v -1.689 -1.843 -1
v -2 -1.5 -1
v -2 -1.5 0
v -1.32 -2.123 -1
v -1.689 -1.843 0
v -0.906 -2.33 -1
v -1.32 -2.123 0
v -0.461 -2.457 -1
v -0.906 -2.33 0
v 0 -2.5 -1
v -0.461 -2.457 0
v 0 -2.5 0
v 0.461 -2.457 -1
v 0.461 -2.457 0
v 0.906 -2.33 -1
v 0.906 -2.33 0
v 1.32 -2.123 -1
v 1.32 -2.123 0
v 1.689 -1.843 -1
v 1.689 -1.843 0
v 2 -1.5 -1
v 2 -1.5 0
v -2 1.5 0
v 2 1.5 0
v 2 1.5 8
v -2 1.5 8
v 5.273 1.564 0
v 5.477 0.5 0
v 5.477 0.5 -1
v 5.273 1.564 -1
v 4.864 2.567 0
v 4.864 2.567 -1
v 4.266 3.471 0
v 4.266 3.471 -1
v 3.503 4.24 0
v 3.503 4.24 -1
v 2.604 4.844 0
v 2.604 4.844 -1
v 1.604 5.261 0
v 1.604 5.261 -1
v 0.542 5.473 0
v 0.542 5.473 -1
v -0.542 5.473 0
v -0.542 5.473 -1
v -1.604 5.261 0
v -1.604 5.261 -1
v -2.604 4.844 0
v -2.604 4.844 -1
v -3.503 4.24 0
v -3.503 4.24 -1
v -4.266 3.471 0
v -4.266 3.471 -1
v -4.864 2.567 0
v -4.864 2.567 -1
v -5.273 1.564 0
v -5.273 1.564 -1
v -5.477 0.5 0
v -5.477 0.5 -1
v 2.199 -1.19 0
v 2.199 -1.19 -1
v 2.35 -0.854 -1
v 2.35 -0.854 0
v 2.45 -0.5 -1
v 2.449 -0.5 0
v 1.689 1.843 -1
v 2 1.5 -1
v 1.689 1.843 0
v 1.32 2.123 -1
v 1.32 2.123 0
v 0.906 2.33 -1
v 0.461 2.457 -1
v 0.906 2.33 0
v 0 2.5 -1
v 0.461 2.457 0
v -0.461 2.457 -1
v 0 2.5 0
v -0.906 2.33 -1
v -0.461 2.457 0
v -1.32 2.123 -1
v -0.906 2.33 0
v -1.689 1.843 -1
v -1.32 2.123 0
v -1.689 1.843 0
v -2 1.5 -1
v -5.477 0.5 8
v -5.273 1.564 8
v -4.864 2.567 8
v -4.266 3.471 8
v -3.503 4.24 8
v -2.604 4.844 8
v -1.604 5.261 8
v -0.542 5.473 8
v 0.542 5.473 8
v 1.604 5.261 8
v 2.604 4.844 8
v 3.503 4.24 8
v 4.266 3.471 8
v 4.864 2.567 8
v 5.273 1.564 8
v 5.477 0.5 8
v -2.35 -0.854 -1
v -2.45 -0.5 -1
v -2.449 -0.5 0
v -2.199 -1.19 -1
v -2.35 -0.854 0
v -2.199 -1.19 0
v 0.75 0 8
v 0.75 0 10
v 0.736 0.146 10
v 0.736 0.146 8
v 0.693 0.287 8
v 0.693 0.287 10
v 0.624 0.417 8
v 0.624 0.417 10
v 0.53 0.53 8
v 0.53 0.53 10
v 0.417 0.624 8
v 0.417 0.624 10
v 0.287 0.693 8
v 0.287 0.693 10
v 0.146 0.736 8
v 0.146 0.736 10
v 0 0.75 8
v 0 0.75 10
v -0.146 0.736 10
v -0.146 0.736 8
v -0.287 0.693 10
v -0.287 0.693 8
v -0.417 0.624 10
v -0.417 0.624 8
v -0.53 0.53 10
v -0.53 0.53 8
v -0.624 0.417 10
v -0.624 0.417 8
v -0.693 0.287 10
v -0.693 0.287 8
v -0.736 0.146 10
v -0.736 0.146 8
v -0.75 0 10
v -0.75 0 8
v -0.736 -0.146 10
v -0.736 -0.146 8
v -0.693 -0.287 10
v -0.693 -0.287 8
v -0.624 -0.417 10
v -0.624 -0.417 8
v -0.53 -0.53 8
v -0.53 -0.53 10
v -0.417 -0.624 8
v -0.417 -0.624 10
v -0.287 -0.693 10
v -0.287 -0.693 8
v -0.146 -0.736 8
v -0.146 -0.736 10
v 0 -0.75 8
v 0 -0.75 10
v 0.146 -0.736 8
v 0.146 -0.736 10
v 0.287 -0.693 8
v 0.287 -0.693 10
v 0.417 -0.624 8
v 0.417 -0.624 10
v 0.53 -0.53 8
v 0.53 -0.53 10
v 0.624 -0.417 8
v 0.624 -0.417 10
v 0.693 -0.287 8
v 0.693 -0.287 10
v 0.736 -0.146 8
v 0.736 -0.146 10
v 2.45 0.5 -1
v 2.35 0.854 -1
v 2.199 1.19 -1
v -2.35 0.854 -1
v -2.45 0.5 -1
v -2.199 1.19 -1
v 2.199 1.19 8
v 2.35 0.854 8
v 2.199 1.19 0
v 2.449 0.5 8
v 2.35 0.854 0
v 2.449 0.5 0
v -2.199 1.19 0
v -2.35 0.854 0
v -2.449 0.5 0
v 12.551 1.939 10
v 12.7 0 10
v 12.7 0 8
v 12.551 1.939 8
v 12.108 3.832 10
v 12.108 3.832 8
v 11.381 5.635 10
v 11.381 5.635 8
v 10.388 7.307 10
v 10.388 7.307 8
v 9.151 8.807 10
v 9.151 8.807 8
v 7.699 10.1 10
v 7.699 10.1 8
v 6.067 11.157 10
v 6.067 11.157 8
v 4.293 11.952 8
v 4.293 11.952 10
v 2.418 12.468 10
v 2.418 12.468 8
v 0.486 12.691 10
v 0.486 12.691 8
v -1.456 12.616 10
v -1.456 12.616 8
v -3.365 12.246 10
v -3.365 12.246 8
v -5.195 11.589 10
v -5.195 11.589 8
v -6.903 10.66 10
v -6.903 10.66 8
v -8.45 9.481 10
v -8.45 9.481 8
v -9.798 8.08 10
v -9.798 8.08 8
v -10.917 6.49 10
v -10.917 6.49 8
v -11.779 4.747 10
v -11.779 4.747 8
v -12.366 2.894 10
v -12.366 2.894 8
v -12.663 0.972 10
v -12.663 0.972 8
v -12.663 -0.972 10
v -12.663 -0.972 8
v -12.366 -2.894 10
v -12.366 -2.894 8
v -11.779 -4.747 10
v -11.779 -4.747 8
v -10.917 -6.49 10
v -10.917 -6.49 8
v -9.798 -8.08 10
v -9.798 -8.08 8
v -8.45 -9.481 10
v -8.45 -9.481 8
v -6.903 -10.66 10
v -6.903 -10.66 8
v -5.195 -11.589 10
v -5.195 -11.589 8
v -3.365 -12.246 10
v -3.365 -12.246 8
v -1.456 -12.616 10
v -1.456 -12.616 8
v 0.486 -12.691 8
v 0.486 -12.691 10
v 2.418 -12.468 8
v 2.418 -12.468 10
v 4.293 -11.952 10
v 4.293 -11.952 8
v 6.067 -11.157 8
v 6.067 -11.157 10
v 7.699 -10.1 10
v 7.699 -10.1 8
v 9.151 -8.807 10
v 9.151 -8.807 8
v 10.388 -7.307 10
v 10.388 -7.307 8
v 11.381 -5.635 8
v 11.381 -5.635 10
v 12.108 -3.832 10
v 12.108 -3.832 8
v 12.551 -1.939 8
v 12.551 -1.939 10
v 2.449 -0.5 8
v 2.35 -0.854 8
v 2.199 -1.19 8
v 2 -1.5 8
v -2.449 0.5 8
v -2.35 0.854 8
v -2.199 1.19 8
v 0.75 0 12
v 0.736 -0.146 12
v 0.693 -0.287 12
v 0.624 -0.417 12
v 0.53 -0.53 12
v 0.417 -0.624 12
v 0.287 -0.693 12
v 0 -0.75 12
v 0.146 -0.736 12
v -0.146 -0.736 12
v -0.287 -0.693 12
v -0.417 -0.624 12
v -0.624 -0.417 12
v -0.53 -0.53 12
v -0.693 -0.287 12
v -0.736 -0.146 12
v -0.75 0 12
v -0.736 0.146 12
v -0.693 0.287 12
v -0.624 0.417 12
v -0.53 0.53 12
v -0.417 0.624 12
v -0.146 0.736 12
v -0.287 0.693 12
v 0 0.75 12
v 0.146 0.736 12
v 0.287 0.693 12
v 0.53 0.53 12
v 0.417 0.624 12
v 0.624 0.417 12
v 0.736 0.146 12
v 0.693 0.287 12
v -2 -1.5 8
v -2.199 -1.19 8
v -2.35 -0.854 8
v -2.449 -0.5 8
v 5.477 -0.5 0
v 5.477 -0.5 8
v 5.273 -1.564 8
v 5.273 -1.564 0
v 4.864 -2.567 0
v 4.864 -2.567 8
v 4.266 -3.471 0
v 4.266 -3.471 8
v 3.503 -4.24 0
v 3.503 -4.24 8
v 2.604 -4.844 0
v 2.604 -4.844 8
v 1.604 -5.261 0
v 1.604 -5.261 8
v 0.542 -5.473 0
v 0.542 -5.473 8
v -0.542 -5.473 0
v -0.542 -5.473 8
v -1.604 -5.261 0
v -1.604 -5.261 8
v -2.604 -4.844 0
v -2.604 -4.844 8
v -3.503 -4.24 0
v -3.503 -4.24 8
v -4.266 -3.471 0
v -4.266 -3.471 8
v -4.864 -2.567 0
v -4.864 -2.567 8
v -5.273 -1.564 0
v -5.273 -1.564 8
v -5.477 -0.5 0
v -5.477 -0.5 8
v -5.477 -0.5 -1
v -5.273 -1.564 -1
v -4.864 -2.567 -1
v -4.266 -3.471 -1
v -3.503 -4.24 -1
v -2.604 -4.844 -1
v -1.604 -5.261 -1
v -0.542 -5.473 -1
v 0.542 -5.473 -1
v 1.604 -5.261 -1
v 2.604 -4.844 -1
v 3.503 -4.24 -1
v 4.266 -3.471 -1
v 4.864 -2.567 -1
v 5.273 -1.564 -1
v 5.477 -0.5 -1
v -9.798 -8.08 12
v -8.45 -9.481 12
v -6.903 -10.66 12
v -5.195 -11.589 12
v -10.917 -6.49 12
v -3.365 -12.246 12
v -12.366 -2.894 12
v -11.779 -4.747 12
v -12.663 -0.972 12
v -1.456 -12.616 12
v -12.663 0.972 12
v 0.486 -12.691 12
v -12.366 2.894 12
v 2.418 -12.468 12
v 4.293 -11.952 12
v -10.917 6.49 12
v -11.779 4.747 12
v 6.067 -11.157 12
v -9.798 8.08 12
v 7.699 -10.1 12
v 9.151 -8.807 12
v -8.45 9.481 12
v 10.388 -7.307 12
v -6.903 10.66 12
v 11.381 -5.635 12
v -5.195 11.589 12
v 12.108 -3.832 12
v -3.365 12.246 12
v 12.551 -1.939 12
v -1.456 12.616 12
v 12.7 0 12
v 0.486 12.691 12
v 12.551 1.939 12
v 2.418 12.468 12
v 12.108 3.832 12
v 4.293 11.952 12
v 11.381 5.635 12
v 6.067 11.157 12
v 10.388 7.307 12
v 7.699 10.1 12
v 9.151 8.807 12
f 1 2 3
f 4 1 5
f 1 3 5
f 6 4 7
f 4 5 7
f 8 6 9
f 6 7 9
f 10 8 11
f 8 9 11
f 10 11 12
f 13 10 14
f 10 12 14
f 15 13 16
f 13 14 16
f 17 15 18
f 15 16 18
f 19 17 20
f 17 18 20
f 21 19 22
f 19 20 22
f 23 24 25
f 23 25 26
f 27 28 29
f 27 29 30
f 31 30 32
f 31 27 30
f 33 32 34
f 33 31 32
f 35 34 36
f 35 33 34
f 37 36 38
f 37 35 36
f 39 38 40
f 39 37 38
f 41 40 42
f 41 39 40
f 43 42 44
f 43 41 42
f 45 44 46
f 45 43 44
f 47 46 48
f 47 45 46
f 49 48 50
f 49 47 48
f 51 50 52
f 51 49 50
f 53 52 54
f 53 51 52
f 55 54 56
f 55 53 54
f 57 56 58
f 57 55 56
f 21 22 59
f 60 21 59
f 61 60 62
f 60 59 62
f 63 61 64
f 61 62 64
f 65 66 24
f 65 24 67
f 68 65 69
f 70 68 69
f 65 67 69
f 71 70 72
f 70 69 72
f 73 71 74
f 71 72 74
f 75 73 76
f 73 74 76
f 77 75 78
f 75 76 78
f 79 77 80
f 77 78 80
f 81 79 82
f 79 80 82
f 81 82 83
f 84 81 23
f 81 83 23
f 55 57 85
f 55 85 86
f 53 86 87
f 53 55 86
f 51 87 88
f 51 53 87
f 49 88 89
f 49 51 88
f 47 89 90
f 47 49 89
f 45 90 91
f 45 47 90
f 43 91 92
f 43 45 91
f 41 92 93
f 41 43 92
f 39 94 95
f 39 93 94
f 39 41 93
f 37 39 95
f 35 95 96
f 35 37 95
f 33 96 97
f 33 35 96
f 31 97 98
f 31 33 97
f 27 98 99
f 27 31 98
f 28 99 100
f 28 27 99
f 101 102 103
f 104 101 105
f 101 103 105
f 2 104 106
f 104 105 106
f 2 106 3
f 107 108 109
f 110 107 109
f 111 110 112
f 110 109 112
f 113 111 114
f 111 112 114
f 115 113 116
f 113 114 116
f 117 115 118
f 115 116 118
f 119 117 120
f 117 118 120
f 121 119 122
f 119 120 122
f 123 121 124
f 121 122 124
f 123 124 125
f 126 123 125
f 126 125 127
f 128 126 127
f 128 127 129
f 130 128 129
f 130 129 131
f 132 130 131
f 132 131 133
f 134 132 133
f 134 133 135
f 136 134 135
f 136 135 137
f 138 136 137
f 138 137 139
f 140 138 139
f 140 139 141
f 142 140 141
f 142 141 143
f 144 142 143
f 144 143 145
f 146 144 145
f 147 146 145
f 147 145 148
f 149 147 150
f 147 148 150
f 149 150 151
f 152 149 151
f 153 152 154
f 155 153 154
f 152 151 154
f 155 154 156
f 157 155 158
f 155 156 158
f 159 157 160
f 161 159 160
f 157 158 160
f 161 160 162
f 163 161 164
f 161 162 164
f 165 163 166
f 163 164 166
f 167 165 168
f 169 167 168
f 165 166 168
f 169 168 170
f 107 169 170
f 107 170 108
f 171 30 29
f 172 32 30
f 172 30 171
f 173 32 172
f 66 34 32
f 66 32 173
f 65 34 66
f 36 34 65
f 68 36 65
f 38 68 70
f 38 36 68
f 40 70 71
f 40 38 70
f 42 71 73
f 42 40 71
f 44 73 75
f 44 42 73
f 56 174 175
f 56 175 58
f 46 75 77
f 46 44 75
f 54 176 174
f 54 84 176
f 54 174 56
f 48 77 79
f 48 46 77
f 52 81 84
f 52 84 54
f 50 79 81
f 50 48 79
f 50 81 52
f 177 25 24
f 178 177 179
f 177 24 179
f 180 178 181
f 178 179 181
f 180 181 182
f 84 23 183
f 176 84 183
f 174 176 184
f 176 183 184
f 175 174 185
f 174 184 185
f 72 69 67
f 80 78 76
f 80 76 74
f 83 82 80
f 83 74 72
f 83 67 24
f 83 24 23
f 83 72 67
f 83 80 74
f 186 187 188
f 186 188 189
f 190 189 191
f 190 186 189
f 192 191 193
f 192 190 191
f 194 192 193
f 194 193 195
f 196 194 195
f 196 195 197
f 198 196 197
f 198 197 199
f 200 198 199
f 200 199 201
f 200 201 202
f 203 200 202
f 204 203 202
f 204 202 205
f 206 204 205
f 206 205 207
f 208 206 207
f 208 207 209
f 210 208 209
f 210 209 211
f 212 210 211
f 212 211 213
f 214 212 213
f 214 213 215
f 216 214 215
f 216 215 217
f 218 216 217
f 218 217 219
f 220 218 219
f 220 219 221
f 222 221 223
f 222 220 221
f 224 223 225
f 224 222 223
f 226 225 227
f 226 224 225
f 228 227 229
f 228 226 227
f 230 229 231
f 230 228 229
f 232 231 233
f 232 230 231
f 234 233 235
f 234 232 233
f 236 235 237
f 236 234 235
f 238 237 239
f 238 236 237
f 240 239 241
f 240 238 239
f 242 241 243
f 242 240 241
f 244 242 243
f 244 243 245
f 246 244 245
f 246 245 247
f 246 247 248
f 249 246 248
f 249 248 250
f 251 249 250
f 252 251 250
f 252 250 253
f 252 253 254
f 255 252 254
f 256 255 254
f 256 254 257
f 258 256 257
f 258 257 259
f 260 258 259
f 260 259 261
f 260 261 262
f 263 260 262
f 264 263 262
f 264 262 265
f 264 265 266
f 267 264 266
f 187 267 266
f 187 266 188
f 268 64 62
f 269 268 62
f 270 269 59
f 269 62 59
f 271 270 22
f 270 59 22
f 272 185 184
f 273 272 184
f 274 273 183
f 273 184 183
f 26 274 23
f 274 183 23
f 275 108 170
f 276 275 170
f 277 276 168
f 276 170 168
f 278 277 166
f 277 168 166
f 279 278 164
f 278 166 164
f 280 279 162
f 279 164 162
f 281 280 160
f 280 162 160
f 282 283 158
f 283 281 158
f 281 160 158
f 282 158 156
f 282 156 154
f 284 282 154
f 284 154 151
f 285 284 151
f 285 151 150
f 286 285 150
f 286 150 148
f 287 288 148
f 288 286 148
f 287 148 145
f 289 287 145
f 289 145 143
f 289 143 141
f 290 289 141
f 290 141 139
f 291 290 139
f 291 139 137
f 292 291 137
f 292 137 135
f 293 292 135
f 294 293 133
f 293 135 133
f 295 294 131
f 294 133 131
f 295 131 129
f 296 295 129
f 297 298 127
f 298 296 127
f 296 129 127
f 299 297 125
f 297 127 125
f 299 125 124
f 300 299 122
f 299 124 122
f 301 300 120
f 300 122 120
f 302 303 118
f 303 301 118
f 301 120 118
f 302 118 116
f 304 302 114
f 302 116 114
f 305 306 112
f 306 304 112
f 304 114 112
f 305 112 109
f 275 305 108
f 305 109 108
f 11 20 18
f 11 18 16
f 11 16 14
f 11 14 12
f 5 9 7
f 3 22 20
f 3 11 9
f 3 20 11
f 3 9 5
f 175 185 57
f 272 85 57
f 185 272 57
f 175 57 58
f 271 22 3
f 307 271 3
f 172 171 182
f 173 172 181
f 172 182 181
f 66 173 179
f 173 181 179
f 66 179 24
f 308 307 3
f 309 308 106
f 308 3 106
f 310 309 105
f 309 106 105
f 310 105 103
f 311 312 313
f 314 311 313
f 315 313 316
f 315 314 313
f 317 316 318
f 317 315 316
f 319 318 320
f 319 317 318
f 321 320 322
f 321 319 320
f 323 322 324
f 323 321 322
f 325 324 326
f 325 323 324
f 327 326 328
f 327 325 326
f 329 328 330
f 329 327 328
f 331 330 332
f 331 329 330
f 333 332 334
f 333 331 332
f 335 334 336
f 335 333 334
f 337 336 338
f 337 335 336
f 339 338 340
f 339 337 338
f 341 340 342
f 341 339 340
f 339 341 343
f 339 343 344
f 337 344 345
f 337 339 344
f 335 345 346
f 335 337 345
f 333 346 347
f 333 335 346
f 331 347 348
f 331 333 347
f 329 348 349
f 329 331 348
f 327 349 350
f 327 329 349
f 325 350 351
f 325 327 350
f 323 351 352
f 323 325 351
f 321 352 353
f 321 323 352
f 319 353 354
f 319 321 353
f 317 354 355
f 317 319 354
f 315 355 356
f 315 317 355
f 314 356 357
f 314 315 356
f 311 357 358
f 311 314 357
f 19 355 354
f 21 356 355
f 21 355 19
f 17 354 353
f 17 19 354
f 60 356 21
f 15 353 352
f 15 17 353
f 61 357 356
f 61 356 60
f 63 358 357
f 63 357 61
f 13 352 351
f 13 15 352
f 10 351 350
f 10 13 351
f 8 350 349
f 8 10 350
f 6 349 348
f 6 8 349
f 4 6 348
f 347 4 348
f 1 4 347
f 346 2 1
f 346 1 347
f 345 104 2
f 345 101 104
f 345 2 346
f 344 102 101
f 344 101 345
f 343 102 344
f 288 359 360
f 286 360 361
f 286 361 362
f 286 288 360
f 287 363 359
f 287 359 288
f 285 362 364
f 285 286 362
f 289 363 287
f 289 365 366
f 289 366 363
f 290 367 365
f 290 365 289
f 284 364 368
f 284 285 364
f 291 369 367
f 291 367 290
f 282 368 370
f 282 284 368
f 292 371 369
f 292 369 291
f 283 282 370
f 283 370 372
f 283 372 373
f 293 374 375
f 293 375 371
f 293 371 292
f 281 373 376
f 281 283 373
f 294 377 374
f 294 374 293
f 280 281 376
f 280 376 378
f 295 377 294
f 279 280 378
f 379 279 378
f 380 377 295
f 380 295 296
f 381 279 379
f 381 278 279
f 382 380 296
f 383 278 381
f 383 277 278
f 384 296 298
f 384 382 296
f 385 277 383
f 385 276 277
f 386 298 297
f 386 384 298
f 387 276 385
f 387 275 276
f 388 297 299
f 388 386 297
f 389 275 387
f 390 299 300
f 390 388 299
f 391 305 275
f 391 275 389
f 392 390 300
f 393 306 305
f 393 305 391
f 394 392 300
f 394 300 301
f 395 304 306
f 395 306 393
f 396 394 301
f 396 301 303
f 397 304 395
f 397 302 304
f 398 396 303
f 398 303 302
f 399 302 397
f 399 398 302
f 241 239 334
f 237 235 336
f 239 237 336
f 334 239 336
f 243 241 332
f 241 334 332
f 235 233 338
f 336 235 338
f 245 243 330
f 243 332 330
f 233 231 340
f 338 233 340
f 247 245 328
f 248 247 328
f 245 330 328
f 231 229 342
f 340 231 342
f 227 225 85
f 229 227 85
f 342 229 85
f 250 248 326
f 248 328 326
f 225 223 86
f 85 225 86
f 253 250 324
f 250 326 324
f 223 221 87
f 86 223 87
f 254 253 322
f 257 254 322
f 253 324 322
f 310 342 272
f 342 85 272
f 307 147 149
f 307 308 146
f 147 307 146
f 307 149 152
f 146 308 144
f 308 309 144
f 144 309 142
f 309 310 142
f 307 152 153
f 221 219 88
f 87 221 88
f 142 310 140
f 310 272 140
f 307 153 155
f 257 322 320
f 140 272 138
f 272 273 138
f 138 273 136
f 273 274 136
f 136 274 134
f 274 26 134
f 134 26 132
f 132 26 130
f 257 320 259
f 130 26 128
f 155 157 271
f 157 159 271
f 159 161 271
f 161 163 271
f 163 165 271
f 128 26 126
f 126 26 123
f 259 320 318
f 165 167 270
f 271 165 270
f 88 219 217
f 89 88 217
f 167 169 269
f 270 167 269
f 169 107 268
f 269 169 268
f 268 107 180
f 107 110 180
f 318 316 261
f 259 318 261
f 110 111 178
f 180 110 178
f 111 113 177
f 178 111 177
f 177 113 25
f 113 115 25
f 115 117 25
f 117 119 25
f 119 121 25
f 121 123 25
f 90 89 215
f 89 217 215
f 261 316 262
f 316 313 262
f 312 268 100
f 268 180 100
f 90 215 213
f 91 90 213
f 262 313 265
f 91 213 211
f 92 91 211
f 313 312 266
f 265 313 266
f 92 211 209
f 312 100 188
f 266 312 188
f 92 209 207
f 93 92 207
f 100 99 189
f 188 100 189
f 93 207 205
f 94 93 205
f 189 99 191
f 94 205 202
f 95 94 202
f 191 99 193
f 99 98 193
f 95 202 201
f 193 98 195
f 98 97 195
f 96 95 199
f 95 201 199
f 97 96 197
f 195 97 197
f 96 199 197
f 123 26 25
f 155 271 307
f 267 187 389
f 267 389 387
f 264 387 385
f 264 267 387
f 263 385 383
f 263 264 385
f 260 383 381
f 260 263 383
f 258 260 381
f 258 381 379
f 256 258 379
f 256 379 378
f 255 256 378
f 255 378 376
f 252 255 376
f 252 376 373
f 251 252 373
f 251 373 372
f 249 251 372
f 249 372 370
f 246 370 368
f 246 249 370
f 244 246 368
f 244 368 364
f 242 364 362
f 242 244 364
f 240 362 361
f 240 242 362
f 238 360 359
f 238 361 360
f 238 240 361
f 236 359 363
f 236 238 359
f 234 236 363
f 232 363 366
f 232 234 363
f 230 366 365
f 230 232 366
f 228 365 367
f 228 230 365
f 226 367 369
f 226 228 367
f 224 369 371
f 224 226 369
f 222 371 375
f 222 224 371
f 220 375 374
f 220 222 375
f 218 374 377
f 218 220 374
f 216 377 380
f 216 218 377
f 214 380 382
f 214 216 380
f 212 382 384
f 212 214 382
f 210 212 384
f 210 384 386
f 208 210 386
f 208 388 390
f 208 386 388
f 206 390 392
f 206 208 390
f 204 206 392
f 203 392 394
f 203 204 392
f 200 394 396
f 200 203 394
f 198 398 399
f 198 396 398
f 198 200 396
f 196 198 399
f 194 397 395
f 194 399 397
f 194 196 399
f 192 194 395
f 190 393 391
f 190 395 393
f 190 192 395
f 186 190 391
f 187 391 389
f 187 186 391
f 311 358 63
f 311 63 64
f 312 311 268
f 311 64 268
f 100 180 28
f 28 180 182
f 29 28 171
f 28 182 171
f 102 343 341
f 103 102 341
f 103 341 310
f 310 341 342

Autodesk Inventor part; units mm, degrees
ref_plane "YZ Plane" through (0, 0, 0) normal (1, 0, 0) x (0, 1, 0)
ref_plane "XZ Plane" through (0, 0, 0) normal (0, 1, 0) x (-1, 0, 0)
ref_plane "XY Plane" through (0, 0, 0) normal (0, 0, 1) x (1, 0, 0)
sketch "Sketch1" plane through (0, 0, 0) normal (0, 0, 1) x (1, 0, 0)
  circle A0 centre (0, 0) radius 2.5
  circle A1 centre (0, 0) radius 5.5
  dimension "d0" = 5
  dimension "d1" = 3
extrude "Extrusion1" add sketch "Sketch1" along normal blind 10
sketch "Sketch2" plane through (0, 0, 0) normal (0, 0, -1) x (-1, 0, 0)
  circle A0 centre (0, 0) radius 2.5 construction
  circle A1 centre (0, 0) radius 5.5 construction
  line L0 (-2, 1.5) -> (2, 1.5)
  circle A2 centre (0, 0) radius 2.5 construction
  line L1 (-2, -1.5) -> (2, -1.5)
  arc A3 (-2, 1.5) -> (-2, -1.5) centre (0, 0) ccw
  arc A4 (2, 1.5) -> (-2, 1.5) centre (0, 0) ccw
  arc A5 (2, -1.5) -> (2, 1.5) centre (0, 0) ccw
  arc A6 (-2, -1.5) -> (2, -1.5) centre (0, 0) ccw
  dimension "d4" = 3
extrude "Extrusion2" add sketch "Sketch2" against normal blind 10 contours A4 L0 | L1 A6
sketch "Sketch3" plane through (0, 0, 0) normal (1, 0, 0) x (0, 1, 0)
  line L0 (-1.5, 0) -> (1.5, 0) construction
  line L1 (1.5, 0) -> (-1.5, 0) construction
  line L2 (-5.5, 0) -> (5.5, 0) construction
  line L3 (1.5, 10) -> (-1.5, 10) construction
  line L4 (-1.5, 10) -> (1.5, 10) construction
  line L5 (5.5, 10) -> (-5.5, 10) construction
  line L6 (-0.5, 8) -> (0.5, 8)
  line L7 (0.5, 8) -> (0.5, 0)
  line L8 (0.5, 0) -> (-0.5, 0)
  line L9 (-0.5, 0) -> (-0.5, 8)
  point P0 (0, 0)
  point P1 (0, 10)
  point P2 (0, 8)
  dimension "d7" = 8
  dimension "d8" = 1
extrude "Extrusion3" cut sketch "Sketch3" along normal through all both and the other way through all
sketch "Sketch4" plane through (0, 0, 10) normal (0, 0, 1) x (1, 0, 0)
  arc A0 (2, -1.5) -> (2, 1.5) centre (0, 0) ccw projected
  line L0 (2, -1.5) -> (-2, -1.5) projected
  arc A1 (-2, 1.5) -> (-2, -1.5) centre (0, 0) ccw projected
  line L1 (-2, 1.5) -> (2, 1.5) projected
  circle A2 centre (0, 0) radius 5.5 projected
extrude "Extrusion4" add sketch "Sketch4" against normal blind 2 contours L0 A1 L1 A0
sketch "Sketch5" plane through (0, 0, 10) normal (0, 0, 1) x (1, 0, 0)
  circle A0 centre (0, 0) radius 5.5 projected
  circle A1 centre (0, 0) radius 12.7
  dimension "d13" = 25.4
extrude "Extrusion5" add sketch "Sketch5" against normal blind 2
sketch "Sketch6" plane through (0, 0, 0) normal (0, 0, -1) x (-1, 0, 0)
  line L0 (5.4772, -0.5) -> (2.4495, -0.5) projected
  arc A0 (2, -1.5) -> (2.4495, -0.5) centre (0, 0) ccw projected
  line L1 (2, -1.5) -> (-2, -1.5) projected
  arc A1 (-2.4495, -0.5) -> (-2, -1.5) centre (0, 0) ccw projected
  line L2 (-2.4495, -0.5) -> (-5.4772, -0.5) projected
  arc A2 (-5.4772, -0.5) -> (5.4772, -0.5) centre (0, 0) ccw projected
  line L3 (2.4495, 0.5) -> (5.4772, 0.5) projected
  arc A3 (5.4772, 0.5) -> (-5.4772, 0.5) centre (0, 0) ccw projected
  line L4 (-5.4772, 0.5) -> (-2.4495, 0.5) projected
  arc A4 (-2, 1.5) -> (-2.4495, 0.5) centre (0, 0) ccw projected
  line L5 (-2, 1.5) -> (2, 1.5) projected
  arc A5 (2.4495, 0.5) -> (2, 1.5) centre (0, 0) ccw projected
  circle A6 centre (0, 0) radius 2.5
extrude "Extrusion6" add sketch "Sketch6" along normal blind 1 contours A2 L2 A1 A6 A0 L0 | A6 L1 | A5 A6 A4 L4 A3 L3 | L5 A6
extrude "Extrusion7" cut sketch "Sketch6" along normal through all contours A0 L1 A1 A6 A4 L5 A5 | A6 L1 | L5 A6
sketch "Sketch7" plane through (0, 0, 10) normal (0, 0, 1) x (1, 0, 0)
  circle A0 centre (0, 0) radius 0.75
  dimension "d20" = 1.5
extrude "Extrusion8" cut sketch "Sketch7" against normal through all
sketch "Sketch8" plane through (0, 0, 10) normal (0, 0, 1) x (1, 0, 0)
  circle A0 centre (0, 0) radius 0.75 projected
  circle A1 centre (0, 0) radius 12.7 projected
extrude "Extrusion9" add sketch "Sketch8" along normal blind 2
properties part number "turntable"
